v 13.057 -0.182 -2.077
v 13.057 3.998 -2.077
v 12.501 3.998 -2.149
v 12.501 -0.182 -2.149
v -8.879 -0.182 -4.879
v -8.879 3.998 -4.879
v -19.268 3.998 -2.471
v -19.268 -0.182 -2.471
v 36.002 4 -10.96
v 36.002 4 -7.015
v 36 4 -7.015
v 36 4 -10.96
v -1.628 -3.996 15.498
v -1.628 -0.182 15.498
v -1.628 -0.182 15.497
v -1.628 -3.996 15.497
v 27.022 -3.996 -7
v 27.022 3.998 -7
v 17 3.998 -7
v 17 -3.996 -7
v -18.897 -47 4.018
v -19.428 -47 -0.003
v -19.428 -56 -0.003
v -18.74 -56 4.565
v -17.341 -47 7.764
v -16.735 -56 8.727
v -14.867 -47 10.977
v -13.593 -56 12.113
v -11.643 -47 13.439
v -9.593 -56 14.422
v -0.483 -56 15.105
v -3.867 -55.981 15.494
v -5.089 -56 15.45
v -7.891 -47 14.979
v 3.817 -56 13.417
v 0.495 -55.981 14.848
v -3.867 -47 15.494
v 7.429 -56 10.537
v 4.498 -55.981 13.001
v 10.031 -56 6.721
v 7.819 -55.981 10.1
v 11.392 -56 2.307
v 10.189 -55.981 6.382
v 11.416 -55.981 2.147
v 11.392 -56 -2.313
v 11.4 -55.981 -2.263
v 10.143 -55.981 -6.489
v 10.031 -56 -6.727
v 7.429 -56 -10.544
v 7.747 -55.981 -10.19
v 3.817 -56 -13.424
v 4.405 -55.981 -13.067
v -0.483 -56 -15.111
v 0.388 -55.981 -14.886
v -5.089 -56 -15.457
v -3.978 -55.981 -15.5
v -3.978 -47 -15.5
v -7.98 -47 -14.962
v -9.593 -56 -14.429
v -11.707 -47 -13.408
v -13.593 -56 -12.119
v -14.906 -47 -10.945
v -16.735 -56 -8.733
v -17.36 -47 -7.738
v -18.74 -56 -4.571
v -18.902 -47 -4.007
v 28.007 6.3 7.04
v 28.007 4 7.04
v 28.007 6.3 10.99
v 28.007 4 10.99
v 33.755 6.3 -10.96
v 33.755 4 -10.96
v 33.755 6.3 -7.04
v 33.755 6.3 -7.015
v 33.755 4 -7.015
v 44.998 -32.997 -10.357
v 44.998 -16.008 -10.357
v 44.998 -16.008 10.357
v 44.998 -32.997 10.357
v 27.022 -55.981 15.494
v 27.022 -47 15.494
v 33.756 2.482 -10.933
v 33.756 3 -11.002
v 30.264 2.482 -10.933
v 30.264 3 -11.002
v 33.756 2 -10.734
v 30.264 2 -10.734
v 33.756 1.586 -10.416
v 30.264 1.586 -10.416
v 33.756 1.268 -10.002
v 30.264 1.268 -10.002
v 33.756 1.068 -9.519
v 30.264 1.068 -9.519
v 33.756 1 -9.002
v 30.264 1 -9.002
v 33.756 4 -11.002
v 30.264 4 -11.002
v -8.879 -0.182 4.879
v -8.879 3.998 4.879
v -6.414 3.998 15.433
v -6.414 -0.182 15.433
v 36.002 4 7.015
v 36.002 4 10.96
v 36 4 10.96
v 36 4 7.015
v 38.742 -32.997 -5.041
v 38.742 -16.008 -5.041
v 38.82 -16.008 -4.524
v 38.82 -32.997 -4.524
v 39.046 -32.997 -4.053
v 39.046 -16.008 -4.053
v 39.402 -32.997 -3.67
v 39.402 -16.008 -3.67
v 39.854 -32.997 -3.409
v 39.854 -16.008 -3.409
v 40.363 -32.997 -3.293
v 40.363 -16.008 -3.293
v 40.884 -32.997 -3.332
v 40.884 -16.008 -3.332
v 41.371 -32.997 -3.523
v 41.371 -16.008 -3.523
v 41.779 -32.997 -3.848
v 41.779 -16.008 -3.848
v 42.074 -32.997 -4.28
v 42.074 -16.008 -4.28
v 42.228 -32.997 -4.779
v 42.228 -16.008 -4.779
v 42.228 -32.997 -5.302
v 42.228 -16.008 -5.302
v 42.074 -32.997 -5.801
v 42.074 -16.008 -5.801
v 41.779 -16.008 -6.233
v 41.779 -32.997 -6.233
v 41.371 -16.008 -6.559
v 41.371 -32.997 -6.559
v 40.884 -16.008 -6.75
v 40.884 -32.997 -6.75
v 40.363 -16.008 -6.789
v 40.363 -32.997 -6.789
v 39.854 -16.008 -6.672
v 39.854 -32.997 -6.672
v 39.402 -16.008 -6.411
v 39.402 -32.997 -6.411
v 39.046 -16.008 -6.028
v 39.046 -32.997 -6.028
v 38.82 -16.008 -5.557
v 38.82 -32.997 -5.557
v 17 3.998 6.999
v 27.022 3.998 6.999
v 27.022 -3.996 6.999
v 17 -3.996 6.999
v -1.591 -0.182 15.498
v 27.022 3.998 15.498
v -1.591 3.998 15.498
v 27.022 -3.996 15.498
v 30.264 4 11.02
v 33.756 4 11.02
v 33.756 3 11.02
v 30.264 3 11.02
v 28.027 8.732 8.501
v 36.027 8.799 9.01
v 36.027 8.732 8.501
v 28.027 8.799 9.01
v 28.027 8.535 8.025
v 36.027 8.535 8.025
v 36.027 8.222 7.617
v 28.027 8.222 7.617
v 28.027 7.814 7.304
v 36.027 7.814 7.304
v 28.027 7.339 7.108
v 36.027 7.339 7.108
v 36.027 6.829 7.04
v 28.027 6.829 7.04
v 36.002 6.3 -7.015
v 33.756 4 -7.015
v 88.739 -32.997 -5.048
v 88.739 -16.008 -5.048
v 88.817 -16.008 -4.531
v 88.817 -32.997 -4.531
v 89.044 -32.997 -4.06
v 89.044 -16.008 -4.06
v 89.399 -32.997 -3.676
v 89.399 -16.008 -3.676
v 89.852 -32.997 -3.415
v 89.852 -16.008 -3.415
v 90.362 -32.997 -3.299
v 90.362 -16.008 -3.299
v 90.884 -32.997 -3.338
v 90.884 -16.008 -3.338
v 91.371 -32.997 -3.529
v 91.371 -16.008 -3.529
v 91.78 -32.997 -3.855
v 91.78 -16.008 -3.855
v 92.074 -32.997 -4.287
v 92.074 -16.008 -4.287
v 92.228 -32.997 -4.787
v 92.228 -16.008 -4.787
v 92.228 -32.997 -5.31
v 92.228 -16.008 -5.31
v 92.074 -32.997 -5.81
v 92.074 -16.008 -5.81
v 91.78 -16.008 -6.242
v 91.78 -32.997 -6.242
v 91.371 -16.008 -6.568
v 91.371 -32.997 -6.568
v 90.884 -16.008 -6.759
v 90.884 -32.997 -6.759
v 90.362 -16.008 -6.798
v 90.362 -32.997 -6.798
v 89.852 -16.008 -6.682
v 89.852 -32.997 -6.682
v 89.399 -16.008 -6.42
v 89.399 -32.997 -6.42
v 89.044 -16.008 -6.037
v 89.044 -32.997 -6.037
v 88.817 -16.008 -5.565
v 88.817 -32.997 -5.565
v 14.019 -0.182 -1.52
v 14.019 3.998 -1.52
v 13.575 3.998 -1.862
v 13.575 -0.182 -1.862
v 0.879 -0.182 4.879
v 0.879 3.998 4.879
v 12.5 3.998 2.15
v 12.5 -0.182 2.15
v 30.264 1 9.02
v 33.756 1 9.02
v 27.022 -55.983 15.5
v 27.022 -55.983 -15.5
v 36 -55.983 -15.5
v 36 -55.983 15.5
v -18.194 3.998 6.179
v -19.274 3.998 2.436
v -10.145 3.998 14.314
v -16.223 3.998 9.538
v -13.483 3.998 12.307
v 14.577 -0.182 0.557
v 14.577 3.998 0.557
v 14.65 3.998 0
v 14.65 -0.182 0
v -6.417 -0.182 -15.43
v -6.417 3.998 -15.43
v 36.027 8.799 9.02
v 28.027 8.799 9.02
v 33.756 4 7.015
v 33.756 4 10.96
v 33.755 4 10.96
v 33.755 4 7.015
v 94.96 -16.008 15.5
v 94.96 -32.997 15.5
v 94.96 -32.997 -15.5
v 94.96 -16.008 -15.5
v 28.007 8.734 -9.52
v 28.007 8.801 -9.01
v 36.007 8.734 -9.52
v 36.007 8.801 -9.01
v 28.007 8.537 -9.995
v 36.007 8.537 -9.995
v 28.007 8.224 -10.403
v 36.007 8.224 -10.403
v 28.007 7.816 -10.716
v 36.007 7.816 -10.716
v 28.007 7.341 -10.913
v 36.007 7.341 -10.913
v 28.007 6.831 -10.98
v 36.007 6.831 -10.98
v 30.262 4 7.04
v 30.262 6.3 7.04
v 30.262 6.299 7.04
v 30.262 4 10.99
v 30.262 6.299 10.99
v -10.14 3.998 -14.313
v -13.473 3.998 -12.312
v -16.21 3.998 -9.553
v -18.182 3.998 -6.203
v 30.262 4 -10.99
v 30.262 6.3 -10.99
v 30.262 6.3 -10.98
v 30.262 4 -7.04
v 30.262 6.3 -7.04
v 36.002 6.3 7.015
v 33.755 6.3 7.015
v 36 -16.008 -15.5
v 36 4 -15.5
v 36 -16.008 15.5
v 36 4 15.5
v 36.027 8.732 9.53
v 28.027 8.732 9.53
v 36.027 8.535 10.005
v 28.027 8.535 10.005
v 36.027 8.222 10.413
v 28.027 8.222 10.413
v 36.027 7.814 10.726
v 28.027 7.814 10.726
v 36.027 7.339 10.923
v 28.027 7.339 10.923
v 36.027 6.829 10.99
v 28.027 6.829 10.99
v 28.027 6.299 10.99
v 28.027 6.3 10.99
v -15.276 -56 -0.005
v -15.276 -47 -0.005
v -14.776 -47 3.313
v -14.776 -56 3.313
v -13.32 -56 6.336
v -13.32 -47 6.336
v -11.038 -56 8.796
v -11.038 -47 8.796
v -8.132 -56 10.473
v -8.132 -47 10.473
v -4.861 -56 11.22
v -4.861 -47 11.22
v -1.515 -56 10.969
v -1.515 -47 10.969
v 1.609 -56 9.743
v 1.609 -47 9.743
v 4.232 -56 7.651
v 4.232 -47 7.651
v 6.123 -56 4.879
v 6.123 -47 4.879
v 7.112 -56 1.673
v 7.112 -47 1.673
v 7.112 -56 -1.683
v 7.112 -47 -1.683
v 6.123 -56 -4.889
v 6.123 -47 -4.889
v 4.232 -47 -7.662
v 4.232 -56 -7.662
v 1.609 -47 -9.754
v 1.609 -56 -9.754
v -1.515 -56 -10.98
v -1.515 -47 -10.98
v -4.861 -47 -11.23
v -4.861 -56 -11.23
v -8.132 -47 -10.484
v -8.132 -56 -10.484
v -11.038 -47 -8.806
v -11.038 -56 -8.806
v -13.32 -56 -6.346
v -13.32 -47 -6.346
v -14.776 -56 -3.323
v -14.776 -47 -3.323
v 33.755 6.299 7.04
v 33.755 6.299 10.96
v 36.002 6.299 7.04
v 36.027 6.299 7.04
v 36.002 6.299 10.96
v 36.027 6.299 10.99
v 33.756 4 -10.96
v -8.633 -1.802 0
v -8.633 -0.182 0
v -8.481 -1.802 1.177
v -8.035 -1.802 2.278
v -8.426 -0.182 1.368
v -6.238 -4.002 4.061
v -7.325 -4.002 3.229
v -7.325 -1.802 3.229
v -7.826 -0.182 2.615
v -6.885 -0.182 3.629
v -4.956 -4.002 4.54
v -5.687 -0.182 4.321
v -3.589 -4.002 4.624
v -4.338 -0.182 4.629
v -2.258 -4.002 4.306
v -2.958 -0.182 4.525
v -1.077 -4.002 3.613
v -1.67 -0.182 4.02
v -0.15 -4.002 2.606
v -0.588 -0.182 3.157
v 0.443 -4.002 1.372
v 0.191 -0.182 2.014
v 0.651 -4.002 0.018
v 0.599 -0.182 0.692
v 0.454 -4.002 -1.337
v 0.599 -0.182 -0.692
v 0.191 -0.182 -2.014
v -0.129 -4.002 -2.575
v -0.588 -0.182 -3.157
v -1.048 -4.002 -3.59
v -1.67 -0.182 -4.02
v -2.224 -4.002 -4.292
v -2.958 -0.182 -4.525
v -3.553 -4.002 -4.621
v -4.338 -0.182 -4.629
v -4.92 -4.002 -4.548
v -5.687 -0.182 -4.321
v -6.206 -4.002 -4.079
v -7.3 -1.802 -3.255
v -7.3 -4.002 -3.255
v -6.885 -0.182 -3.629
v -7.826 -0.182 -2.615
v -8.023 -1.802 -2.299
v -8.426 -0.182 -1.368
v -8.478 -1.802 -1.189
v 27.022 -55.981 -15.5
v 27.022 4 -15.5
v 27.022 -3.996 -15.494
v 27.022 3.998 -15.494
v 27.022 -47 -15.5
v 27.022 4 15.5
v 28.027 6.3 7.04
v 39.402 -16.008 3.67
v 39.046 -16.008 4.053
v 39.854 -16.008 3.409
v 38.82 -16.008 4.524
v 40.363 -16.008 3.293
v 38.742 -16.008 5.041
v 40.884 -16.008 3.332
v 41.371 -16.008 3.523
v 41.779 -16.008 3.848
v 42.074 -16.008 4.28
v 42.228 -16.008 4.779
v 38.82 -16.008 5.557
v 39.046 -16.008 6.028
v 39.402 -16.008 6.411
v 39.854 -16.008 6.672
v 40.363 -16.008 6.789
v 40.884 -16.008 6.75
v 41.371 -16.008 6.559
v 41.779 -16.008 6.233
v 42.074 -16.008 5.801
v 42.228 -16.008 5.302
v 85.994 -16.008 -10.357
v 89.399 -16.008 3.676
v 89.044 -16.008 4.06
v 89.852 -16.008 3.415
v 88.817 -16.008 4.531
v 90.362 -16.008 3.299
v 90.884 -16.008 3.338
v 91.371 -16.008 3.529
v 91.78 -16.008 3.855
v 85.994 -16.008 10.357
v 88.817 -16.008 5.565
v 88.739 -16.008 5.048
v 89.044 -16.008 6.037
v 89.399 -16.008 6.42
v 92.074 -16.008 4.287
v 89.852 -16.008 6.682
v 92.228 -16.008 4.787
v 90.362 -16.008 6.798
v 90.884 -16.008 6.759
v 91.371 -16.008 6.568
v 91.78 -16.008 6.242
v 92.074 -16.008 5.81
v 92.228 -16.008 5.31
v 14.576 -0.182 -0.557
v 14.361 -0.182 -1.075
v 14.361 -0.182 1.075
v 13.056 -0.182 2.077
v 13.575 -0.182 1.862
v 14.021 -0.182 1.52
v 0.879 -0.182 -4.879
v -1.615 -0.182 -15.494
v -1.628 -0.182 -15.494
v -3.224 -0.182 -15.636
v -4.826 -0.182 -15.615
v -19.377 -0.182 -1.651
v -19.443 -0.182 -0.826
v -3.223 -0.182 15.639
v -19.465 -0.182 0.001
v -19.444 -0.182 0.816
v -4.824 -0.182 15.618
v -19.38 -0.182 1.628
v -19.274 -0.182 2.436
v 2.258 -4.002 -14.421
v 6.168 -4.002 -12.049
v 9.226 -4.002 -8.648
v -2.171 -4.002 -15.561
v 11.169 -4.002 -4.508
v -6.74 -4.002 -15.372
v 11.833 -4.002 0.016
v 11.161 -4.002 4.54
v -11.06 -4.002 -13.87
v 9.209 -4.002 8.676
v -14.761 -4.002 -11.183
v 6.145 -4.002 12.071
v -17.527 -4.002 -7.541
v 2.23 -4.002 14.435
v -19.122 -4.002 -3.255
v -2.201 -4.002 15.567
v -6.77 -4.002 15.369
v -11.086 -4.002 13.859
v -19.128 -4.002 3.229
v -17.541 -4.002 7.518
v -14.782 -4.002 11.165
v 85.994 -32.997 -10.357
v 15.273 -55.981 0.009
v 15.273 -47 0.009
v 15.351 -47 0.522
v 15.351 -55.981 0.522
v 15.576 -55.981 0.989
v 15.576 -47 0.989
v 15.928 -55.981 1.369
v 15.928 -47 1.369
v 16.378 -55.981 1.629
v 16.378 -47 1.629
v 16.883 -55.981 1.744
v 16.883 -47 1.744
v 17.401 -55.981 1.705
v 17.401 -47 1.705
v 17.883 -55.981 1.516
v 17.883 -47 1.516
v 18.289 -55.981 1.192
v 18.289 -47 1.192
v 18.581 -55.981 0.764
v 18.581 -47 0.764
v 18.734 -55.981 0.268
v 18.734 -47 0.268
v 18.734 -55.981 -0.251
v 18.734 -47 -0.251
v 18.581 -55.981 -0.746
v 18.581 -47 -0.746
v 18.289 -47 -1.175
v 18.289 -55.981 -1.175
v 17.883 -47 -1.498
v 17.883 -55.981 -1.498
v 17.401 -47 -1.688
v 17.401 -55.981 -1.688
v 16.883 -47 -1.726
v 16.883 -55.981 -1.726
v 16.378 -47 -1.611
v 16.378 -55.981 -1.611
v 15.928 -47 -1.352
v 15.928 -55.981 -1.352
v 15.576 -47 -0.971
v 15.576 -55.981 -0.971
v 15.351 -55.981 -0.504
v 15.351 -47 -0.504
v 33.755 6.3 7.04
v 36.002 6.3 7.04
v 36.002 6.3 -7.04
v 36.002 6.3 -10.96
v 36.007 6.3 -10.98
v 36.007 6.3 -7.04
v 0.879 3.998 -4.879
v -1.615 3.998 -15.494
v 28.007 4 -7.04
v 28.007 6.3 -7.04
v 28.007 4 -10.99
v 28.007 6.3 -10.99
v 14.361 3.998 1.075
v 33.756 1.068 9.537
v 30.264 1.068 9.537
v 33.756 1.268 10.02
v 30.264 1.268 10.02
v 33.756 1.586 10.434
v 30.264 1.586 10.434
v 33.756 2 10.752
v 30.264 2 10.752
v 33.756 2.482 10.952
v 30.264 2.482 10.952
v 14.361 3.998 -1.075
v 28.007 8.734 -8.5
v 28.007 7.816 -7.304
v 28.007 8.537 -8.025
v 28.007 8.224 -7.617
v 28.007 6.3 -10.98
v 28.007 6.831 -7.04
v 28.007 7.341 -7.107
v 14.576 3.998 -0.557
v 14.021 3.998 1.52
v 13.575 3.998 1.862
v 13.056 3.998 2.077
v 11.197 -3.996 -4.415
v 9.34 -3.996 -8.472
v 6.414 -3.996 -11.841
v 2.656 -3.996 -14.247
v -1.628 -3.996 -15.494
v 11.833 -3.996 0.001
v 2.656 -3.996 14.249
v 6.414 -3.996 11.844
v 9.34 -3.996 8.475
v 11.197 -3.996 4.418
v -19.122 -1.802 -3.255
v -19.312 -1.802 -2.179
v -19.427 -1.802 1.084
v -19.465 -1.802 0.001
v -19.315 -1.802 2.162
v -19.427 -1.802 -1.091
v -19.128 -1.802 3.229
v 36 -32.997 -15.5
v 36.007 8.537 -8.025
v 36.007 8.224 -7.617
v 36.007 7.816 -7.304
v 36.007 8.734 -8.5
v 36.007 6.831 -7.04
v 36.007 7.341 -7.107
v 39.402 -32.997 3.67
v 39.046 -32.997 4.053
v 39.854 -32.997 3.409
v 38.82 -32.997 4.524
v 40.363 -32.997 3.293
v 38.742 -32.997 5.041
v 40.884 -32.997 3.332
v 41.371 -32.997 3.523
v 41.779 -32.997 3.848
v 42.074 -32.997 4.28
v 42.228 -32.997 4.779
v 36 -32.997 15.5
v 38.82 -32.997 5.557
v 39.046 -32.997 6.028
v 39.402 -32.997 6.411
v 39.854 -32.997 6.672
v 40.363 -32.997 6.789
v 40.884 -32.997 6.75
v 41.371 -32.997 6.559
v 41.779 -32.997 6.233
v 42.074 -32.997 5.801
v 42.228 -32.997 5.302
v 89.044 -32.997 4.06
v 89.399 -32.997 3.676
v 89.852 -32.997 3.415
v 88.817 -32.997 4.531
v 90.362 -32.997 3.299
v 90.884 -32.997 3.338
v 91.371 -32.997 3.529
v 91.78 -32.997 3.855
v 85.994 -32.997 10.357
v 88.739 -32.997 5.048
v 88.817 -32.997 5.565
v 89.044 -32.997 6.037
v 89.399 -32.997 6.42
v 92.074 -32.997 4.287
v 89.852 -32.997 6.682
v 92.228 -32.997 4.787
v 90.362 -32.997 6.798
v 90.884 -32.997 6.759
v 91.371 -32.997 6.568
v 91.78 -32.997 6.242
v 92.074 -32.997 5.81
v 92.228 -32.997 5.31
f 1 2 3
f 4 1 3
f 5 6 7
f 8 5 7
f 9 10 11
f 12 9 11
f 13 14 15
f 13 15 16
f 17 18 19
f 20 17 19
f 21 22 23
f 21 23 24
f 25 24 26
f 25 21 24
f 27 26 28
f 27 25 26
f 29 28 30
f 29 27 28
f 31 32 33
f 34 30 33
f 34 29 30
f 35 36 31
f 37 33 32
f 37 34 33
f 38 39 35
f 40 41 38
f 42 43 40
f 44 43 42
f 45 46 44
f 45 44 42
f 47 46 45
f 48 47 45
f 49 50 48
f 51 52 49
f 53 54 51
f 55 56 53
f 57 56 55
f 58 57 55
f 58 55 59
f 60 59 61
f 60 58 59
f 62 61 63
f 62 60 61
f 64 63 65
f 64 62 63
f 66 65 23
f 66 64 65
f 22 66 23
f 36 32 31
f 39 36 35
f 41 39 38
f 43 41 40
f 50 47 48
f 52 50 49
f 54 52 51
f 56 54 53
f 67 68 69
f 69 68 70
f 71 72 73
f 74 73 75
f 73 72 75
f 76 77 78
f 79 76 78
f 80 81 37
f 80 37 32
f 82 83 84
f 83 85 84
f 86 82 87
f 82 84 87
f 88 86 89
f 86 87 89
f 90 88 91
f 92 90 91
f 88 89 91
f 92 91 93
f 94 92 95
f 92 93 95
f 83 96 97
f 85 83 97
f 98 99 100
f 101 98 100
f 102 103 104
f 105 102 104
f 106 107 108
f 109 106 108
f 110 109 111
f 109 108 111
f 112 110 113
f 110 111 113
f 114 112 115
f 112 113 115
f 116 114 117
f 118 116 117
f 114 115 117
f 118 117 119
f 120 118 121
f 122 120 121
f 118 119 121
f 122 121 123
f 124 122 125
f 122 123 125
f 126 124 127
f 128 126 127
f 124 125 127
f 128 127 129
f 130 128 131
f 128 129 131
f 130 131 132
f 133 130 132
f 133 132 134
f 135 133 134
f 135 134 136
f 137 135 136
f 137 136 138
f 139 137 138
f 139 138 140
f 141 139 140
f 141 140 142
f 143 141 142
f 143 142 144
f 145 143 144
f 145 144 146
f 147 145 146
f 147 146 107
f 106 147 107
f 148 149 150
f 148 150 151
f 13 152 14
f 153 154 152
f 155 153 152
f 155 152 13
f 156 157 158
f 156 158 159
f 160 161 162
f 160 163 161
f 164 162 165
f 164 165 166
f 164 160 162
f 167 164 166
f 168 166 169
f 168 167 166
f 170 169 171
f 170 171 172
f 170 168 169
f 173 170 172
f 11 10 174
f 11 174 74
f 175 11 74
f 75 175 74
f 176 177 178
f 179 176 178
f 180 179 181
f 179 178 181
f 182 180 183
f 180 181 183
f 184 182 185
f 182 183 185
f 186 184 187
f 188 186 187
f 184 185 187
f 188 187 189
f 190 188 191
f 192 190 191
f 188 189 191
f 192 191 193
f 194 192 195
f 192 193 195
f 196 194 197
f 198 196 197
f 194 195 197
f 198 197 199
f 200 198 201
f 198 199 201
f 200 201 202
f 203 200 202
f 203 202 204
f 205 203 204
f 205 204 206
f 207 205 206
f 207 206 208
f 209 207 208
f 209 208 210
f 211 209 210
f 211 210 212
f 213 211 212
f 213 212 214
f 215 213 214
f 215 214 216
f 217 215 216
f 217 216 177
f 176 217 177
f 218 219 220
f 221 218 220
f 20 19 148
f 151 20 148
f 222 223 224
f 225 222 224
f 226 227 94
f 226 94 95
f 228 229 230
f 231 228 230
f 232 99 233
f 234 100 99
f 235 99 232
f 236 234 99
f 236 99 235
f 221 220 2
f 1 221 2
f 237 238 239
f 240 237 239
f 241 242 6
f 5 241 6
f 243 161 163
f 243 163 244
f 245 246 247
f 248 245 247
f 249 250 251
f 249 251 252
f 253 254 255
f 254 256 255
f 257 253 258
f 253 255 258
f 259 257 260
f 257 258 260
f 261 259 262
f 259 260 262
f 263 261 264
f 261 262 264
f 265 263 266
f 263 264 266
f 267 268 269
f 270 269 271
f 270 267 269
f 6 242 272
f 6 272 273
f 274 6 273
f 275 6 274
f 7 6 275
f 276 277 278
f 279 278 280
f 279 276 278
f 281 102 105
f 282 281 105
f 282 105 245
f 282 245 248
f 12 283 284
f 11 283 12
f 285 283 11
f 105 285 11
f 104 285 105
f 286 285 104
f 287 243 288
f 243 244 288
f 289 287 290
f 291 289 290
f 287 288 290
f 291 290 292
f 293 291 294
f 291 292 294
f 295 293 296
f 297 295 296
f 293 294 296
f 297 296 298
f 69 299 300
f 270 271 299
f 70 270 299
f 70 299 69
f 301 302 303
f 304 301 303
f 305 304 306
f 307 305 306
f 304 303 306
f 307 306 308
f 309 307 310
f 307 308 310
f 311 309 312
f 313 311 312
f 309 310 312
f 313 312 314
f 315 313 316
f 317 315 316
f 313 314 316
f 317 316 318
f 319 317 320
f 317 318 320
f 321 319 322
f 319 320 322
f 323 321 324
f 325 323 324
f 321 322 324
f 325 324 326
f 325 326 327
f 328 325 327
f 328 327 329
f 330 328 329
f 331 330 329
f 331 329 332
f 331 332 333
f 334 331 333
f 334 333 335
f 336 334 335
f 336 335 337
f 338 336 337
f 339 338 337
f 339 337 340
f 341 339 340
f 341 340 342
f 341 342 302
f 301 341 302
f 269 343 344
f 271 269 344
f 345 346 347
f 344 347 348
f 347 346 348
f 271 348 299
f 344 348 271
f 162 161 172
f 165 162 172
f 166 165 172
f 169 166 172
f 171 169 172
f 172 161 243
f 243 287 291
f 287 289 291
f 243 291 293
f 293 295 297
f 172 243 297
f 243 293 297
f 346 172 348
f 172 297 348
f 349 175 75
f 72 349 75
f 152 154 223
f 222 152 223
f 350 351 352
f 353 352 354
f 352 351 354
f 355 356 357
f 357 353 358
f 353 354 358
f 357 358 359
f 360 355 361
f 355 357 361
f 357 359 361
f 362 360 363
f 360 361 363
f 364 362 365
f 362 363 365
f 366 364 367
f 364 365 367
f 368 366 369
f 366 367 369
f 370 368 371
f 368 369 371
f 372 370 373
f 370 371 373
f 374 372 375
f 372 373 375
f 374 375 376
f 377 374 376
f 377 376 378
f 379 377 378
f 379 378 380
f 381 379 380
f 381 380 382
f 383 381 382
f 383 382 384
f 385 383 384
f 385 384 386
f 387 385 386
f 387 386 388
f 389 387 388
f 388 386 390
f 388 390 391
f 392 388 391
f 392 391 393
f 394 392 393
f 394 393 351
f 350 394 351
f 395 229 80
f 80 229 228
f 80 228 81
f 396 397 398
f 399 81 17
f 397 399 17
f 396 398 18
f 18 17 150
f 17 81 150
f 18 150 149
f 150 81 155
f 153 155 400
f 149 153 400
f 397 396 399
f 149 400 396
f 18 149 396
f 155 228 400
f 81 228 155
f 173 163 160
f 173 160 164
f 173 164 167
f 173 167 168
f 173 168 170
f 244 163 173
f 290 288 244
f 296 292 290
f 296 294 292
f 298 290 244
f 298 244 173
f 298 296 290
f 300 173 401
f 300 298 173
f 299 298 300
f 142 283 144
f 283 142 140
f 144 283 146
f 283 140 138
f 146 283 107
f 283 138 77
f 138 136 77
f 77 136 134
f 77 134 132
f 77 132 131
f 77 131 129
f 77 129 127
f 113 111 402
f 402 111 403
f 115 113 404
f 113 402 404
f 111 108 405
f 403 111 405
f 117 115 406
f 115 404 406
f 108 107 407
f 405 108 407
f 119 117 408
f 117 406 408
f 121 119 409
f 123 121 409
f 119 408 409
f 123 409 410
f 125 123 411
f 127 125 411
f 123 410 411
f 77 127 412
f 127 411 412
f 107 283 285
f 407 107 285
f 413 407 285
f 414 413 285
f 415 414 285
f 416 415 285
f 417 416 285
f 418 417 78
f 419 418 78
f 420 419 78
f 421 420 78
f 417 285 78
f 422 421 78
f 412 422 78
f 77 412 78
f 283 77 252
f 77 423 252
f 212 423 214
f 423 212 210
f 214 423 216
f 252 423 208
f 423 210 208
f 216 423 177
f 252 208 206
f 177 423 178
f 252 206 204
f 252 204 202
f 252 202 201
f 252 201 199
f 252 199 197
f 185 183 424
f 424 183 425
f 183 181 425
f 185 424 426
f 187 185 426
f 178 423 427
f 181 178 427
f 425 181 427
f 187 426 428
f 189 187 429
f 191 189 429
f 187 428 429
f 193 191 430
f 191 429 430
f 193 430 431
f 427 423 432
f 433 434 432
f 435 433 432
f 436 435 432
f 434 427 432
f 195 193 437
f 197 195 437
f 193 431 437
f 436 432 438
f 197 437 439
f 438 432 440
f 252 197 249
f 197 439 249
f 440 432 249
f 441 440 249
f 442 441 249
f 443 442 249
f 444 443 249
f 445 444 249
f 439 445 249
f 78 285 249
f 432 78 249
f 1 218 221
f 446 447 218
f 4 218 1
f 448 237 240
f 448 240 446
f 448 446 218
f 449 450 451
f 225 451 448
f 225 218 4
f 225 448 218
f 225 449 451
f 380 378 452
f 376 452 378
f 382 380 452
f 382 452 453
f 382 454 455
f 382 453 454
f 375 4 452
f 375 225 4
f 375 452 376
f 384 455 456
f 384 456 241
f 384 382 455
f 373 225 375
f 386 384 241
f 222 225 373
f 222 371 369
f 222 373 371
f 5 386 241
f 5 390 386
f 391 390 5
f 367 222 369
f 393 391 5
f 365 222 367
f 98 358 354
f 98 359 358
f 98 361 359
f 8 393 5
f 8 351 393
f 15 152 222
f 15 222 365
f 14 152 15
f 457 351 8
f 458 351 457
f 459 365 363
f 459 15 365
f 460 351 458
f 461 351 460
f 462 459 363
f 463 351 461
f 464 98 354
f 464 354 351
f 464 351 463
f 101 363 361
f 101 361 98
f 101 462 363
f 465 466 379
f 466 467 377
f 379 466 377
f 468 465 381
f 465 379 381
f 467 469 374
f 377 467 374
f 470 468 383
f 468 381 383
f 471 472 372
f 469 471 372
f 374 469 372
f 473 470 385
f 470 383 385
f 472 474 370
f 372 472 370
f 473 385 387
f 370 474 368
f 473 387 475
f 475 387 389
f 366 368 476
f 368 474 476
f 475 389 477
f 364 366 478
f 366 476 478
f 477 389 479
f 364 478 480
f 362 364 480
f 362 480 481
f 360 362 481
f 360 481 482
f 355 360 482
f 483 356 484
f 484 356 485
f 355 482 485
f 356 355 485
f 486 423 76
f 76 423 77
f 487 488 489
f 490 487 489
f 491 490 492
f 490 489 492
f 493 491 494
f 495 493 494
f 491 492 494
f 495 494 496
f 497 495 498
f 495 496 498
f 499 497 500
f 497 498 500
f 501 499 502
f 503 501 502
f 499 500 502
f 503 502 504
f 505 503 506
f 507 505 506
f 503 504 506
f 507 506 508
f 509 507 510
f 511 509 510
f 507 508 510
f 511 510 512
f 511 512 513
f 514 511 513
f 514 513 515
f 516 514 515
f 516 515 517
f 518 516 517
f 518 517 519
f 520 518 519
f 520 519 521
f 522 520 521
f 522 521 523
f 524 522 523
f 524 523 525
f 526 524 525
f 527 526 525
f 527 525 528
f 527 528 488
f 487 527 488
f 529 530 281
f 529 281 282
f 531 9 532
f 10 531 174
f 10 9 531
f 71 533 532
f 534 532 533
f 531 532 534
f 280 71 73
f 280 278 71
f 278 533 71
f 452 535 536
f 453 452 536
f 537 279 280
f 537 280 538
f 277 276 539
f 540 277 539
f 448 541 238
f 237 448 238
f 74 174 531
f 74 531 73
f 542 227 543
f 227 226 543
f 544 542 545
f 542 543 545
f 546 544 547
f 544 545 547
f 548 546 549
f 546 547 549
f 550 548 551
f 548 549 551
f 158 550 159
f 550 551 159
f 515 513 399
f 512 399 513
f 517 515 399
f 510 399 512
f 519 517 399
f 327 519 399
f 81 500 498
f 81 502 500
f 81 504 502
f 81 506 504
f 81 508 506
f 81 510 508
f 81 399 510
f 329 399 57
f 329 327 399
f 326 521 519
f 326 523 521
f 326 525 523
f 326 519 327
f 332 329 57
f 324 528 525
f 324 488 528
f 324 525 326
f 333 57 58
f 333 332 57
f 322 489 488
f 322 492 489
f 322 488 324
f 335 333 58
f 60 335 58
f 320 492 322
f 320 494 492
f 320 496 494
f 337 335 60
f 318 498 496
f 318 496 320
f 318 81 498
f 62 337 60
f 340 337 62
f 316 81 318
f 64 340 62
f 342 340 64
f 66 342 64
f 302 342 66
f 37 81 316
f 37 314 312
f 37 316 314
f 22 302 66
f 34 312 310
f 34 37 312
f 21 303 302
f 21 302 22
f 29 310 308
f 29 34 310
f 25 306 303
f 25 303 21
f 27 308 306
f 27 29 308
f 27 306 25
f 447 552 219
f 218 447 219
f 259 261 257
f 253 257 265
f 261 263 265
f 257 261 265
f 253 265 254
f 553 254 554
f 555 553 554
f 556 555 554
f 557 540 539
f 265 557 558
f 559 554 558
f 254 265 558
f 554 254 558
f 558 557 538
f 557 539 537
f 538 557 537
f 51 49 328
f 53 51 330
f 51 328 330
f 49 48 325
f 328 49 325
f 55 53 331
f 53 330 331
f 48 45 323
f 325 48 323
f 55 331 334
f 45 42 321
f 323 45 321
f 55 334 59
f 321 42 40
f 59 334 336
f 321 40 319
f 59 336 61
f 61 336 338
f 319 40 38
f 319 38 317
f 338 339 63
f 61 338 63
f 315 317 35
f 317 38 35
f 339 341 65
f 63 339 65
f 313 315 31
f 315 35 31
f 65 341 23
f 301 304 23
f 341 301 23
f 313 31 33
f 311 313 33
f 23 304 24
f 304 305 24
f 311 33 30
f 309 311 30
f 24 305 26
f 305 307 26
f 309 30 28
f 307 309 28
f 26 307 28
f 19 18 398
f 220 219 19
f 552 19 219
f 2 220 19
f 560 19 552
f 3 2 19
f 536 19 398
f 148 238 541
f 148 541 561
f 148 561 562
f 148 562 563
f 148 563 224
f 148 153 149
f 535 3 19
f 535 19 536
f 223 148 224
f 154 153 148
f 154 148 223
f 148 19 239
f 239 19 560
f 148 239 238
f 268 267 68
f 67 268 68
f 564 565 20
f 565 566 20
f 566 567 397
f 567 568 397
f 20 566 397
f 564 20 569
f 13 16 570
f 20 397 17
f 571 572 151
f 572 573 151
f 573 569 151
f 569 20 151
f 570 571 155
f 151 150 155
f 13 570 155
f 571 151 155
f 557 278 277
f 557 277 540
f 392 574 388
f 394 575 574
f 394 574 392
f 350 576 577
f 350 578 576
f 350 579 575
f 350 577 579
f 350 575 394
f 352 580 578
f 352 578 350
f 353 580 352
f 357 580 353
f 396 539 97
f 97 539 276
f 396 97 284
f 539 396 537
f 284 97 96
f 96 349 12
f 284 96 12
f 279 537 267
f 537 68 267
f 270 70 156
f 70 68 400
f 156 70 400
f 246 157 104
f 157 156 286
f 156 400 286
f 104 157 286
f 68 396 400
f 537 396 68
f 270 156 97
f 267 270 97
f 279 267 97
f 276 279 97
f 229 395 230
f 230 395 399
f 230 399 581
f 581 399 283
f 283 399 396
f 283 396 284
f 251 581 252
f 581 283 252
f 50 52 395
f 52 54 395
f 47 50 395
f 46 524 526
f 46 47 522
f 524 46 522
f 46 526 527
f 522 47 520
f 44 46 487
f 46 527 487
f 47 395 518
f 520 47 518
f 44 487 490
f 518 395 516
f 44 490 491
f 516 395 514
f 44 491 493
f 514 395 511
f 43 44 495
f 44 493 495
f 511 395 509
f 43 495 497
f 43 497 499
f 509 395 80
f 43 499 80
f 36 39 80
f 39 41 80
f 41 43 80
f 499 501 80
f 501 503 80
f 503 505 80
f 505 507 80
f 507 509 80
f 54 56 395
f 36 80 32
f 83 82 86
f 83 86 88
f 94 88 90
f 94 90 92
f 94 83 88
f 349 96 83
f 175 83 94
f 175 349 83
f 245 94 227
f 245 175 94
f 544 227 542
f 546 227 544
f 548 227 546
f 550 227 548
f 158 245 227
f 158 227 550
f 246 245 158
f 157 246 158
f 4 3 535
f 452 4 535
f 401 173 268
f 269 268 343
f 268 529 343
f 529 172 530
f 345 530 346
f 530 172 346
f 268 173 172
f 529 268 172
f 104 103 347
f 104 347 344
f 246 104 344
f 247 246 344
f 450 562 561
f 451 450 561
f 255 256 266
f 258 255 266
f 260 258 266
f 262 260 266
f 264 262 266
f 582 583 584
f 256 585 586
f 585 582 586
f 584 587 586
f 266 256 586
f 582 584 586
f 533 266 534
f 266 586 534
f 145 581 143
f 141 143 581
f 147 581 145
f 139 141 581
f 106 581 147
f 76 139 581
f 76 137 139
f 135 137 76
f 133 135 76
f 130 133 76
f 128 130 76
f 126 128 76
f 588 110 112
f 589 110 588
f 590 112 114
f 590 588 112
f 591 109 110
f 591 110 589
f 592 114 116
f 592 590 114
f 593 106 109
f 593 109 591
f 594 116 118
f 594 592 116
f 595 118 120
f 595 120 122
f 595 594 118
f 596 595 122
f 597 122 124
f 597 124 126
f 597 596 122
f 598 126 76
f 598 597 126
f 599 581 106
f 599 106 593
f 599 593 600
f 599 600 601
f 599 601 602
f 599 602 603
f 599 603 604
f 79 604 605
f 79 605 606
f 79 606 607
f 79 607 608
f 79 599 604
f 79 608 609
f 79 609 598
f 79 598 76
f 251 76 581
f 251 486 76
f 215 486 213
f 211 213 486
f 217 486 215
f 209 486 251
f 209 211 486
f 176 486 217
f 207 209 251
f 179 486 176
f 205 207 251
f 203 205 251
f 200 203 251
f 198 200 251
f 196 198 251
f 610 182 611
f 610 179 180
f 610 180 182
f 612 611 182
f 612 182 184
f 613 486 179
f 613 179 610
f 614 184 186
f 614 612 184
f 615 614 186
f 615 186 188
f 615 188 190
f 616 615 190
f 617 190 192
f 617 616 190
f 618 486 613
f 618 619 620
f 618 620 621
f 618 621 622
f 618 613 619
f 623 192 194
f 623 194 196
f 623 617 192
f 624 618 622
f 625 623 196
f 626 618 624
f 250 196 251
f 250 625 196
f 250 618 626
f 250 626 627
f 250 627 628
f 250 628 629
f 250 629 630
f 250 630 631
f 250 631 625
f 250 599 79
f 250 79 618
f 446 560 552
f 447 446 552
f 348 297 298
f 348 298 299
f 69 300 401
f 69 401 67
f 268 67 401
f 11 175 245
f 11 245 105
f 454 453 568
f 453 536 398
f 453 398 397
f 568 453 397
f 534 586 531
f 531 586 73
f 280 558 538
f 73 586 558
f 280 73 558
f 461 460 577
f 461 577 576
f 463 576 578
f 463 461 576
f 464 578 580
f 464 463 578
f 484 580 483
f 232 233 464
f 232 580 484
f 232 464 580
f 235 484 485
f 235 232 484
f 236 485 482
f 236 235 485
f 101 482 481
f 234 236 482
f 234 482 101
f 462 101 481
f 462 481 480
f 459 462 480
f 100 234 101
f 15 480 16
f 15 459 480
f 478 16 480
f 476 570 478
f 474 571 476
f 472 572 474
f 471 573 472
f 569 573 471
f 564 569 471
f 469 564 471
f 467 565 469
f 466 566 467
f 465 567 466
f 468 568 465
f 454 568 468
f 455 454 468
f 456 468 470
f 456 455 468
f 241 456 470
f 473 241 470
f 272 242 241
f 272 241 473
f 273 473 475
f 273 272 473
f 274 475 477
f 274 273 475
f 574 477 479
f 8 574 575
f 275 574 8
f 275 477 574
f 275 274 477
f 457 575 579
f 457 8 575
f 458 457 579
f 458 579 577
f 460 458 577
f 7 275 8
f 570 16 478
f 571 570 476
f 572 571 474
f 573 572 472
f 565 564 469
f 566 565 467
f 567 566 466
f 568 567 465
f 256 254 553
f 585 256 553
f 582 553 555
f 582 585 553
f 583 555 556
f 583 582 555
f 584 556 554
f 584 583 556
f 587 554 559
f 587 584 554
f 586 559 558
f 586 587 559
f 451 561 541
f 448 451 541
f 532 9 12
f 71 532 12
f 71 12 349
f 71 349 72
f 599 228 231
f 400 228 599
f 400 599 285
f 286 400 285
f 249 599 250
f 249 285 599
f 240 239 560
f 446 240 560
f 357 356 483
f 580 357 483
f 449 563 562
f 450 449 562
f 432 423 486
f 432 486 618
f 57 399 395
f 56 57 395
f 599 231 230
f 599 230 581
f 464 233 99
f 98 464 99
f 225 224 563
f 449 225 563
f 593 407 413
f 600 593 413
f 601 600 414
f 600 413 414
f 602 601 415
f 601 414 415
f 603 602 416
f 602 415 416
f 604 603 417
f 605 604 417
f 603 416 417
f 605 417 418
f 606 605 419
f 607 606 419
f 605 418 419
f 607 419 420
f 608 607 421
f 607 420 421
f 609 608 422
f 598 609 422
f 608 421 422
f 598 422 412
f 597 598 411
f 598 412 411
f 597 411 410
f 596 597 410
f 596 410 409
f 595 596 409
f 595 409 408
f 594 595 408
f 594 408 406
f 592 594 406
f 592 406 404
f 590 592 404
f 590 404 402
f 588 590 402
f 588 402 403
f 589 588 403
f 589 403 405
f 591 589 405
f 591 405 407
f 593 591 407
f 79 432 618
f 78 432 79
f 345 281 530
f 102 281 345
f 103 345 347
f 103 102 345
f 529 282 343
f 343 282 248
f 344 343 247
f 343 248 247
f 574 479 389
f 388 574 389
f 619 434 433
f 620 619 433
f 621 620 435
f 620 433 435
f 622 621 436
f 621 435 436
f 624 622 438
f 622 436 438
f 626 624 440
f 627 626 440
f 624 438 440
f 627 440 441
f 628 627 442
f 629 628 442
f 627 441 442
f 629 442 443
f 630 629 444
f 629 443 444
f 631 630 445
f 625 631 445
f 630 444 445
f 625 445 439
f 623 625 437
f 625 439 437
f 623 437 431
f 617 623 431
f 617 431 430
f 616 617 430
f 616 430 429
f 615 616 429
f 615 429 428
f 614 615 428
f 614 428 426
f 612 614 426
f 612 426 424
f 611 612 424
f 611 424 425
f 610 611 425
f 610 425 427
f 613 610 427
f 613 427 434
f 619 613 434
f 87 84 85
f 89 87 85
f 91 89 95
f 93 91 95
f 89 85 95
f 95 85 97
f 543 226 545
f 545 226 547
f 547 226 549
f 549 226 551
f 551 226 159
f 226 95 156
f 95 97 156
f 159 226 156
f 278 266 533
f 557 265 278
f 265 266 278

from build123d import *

# Parameters (mm, degrees)
SKETCH002_W     = 8.977869
SKETCH002_H     = 59.983136
PAD001_DEPTH    = 15.5
SKETCH003_W     = 3.492328
SKETCH003_H     = 22.021174
POCKET001_DEPTH = 3
FILLET_R        = 2
FILLET001_R     = 2
SKETCH004_W     = 2.246188
SKETCH004_H     = 3.944797
SKETCH004_W_2   = 2.255042
SKETCH004_H_2   = 3.950065
PAD002_DEPTH    = 2.3
SKETCH007_W     = 7.994439
SKETCH007_H     = 30.992103
PAD004_DEPTH    = 28.65
SKETCH008_R     = 15.649013
PAD005_DEPTH    = 8
SKETCH009_W     = 10.023189
SKETCH009_H     = 13.999053
POCKET002_DEPTH = 8.001
POCKET003_DEPTH = 4.18
SKETCH011_R     = 4.641628
POCKET004_DEPTH = 5
POCKET007_DEPTH = 2.2
SKETCH012_W     = 8.980885
SKETCH012_H     = 30.993558
PAD006_DEPTH    = 31
SKETCH013_R     = 15.496795
PAD007_DEPTH    = 9
SKETCH014_R     = 11.256607
POCKET005_DEPTH = 9.001
SKETCH015_R     = 1.740109
POCKET006_DEPTH = 9.001
SKETCH006_W     = 2.5
SKETCH006_H     = 3.94941
EXTRUDE_DEPTH   = 8
FILLET003_R     = 1.97
SKETCH005_W     = 2.501053
SKETCH005_H     = 3.940234
PAD003_DEPTH    = 8
FILLET002_R     = 1.97
SKETCH_W        = 58.960041
SKETCH_H        = 16.989173
PAD_DEPTH       = 15.5
SKETCH001_R     = 1.754684
SKETCH001_R_2   = 1.752789
SKETCH001_W     = 40.995754
SKETCH001_H     = 20.714458
POCKET_DEPTH    = 16.990173


with BuildPart() as rect_ngulo_vertical:
    # Sketch002 → Pad001 (new body, symmetric)
    with BuildSketch(Plane.XY):
        with Locations((31.5110655, -25.991567)):
            Rectangle(SKETCH002_W, SKETCH002_H)
    extrude(amount=PAD001_DEPTH, both=True)

    # Sketch003 (on Face1 of Pad001) → Pocket001 (cut)
    with BuildSketch(Plane(origin=(0, 4.000001, 0), x_dir=(-1, 0, 0), z_dir=(0, 1, 0))):
        with Locations((-32.0097, 0.009076)):
            Rectangle(SKETCH003_W, SKETCH003_H)
    extrude(amount=-POCKET001_DEPTH, mode=Mode.SUBTRACT)

    # Fillet
    fillet_edges = [rect_ngulo_vertical.edges().sort_by_distance(p)[0] for p in [
        (32.0097, 1.000001, -11.001511),
    ]]
    fillet(fillet_edges, radius=FILLET_R)

    # Fillet001
    fillet001_edges = [rect_ngulo_vertical.edges().sort_by_distance(p)[0] for p in [
        (32.0097, 1.000001, 11.019663),
    ]]
    fillet(fillet001_edges, radius=FILLET001_R)

    # Sketch004 (on Face7 of Fillet001) → Pad002 (join)
    with BuildSketch(Plane(origin=(0, 4.000001, 0), x_dir=(-1, 0, 0), z_dir=(0, 1, 0))):
        with Locations((-34.878453, -8.9877845)):
            Rectangle(SKETCH004_W, SKETCH004_H)
        with Locations((-29.13443, -9.0147575)):
            Rectangle(SKETCH004_W_2, SKETCH004_H_2)
        with Locations((-34.878453, 8.9877845)):
            Rectangle(SKETCH004_W, SKETCH004_H)
        with Locations((-29.13443, 9.0147575)):
            Rectangle(SKETCH004_W_2, SKETCH004_H_2)
    extrude(amount=PAD002_DEPTH)


with BuildPart() as parte_arriba_motor:
    # Sketch007 (on Face1 of CopyPad004) → Pad004 (new body)
    with BuildSketch(Plane(origin=(27.022131, 0, 0), x_dir=(0, -1, 0), z_dir=(-1, 0, 0))):
        with Locations((-0.0007855, 0.0019735)):
            Rectangle(SKETCH007_W, SKETCH007_H)
    extrude(amount=PAD004_DEPTH)

    # Sketch008 (on Face3 of Pad004) → Pad005 (join)
    with BuildSketch(Plane(origin=(0, 3.998005, 0), x_dir=(-1, 0, 0), z_dir=(0, 1, 0))):
        with Locations((3.815743, 0.001435)):
            Circle(SKETCH008_R)
    extrude(amount=-PAD005_DEPTH)

    # Sketch009 (on Face9 of Pad005) → Pocket002 (cut, through all)
    with BuildSketch(Plane(origin=(0, 3.998005, 0), x_dir=(-1, 0, 0), z_dir=(0, 1, 0))):
        with Locations((-22.0115905, -0.0004715)):
            Rectangle(SKETCH009_W, SKETCH009_H)
    extrude(amount=-POCKET002_DEPTH, mode=Mode.SUBTRACT)

    # Sketch010 (on Face12 of Pocket002) → Pocket003 (cut)
    with BuildSketch(Plane(origin=(0, 3.998005, 0), x_dir=(-1, 0, 0), z_dir=(0, 1, 0))):
        Polygon((-0.879047, 4.879039), (-12.499996, 2.15), (-13.056458, 2.076739), (-13.574997, 1.861954), (-14.020602, 1.519604), (-14.361478, 1.075023), (-14.576989, 0.55653), (-14.649981, 0), (-14.576447, -0.556616), (-14.361427, -1.07512), (-14.019322, -1.51973), (-13.575246, -1.861696), (-13.056714, -2.076535), (-12.500516, -2.149443), (-0.879091, -4.879015), (1.6565, -15.670952), (4.613011, -15.847545), (6.390335, -15.545628), (8.879035, -4.879036), (19.292059, -2.465662), (19.451073, -1.246381), (19.49725, -0.017855), (19.447609, 1.211716), (19.306059, 2.428864), (8.879012, 4.879032), (6.402977, 15.480504), (4.635699, 15.800562), (1.61602, 15.605743), align=None)
    extrude(amount=-POCKET003_DEPTH, mode=Mode.SUBTRACT)

    # Sketch011 (on Face14 of Pocket003) → Pocket004 (cut)
    with BuildSketch(Plane(origin=(0, -0.181995, 0), x_dir=(-1, 0, 0), z_dir=(0, 1, 0))):
        with Locations((3.991006, 0)):
            Circle(SKETCH011_R)
    extrude(amount=-POCKET004_DEPTH, mode=Mode.SUBTRACT)

    # Sketch016 (on Face20 of Pocket004) → Pocket007 (cut)
    with BuildSketch(Plane.XZ.offset(4.001995)):
        Polygon((-19.274756, 3.229076), (-19.698963, 0), (-19.323395, -3.255331), (-6.564783, -3.255331), (-7.508081, -1.875622), (-7.786129, -0.643242), (-7.892649, 0.261497), (-7.606458, 1.237008), (-7.387746, 2.244735), (-6.500566, 3.229076), align=None)
    extrude(amount=-POCKET007_DEPTH, mode=Mode.SUBTRACT)


with BuildPart() as parte_abajo_motor:
    # Sketch012 (on Face1 of CopyPad005) → Pad006 (new body)
    with BuildSketch(Plane(origin=(27.022131, 0, 0), x_dir=(0, -1, 0), z_dir=(-1, 0, 0))):
        with Locations((51.4901415, -0.003249)):
            Rectangle(SKETCH012_W, SKETCH012_H)
    extrude(amount=PAD006_DEPTH)

    # Sketch013 (on Face4 of Pad006) → Pad007 (join)
    with BuildSketch(Plane(origin=(0, -46.999699, 0), x_dir=(-1, 0, 0), z_dir=(0, 1, 0))):
        with Locations((3.931386, -0.003132)):
            Circle(SKETCH013_R)
    extrude(amount=-PAD007_DEPTH)

    # Sketch014 (on Face8 of Pad007) → Pocket005 (cut, through all)
    with BuildSketch(Plane(origin=(0, -46.999699, 0), x_dir=(-1, 0, 0), z_dir=(0, 1, 0))):
        with Locations((4.019337, -0.005181)):
            Circle(SKETCH014_R)
    extrude(amount=-POCKET005_DEPTH, mode=Mode.SUBTRACT)

    # Sketch015 (on Face2 of Pocket005) → Pocket006 (cut, through all)
    with BuildSketch(Plane(origin=(0, -46.999699, 0), x_dir=(-1, 0, 0), z_dir=(0, 1, 0))):
        with Locations((-17.01331, 0.008823)):
            Circle(SKETCH015_R)
    extrude(amount=-POCKET006_DEPTH, mode=Mode.SUBTRACT)


with BuildPart() as fillet003:
    # Sketch006 (on Face1 of CopyPad003) → Extrude (new body)
    with BuildSketch(Plane(origin=(28.006909, 0, 0), x_dir=(0, -1, 0), z_dir=(-1, 0, 0))):
        with Locations((-7.549415, 9.015147)):
            Rectangle(SKETCH006_W, SKETCH006_H)
    extrude(amount=EXTRUDE_DEPTH)


with BuildPart() as fillet003_1:
    # Extrude placement: moved
    add(fillet003.part.moved(Location((8.02, 0, 0))))

    # Fillet003
    fillet003_edges = [fillet003_1.edges().sort_by_distance(p)[0] for p in [
        (32.026909, 8.799415, 10.989852),
        (32.026909, 8.799415, 7.040442),
    ]]
    fillet(fillet003_edges, radius=FILLET003_R)


with BuildPart() as arcos:
    # Sketch005 (on Face1 of CopyPad002) → Pad003 (new body)
    with BuildSketch(Plane(origin=(28.006909, 0, 0), x_dir=(0, -1, 0), z_dir=(-1, 0, 0))):
        with Locations((-7.5503545, -9.00987)):
            Rectangle(SKETCH005_W, SKETCH005_H)
    extrude(amount=-PAD003_DEPTH)

    # Fillet002
    fillet002_edges = [arcos.edges().sort_by_distance(p)[0] for p in [
        (32.006909, 8.800881, -7.039753),
        (32.006909, 8.800881, -10.979987),
    ]]
    fillet(fillet002_edges, radius=FILLET002_R)

    # Fusion: union Fillet003
    add(fillet003_1.part)


with BuildPart() as eslab_n:
    # Sketch → Pad (new body, symmetric)
    with BuildSketch(Plane.XY):
        with Locations((65.4798945, -24.5020905)):
            Rectangle(SKETCH_W, SKETCH_H)
    extrude(amount=PAD_DEPTH, both=True)

    # Sketch001 (on Face1 of Pad) → Pocket (cut, through all)
    with BuildSketch(Plane(origin=(0, -16.007504, 0), x_dir=(-1, 0, 0), z_dir=(0, 1, 0))):
        with Locations((-90.493328, 5.048292)):
            Circle(SKETCH001_R)
        with Locations((-90.493328, -5.048292)):
            Circle(SKETCH001_R)
        with Locations((-40.494466, 5.040685)):
            Circle(SKETCH001_R_2)
        with Locations((-40.494466, -5.040685)):
            Circle(SKETCH001_R_2)
        with Locations((-65.495859, 0.000125)):
            Rectangle(SKETCH001_W, SKETCH001_H)
    extrude(amount=-POCKET_DEPTH, mode=Mode.SUBTRACT)

    # Fusion001: union rectángulo_vertical, parte_arriba_motor, parte_abajo_motor, arcos
    add(rect_ngulo_vertical.part)
    add(parte_arriba_motor.part)
    add(parte_abajo_motor.part)
    add(arcos.part)


solid = eslab_n.part
